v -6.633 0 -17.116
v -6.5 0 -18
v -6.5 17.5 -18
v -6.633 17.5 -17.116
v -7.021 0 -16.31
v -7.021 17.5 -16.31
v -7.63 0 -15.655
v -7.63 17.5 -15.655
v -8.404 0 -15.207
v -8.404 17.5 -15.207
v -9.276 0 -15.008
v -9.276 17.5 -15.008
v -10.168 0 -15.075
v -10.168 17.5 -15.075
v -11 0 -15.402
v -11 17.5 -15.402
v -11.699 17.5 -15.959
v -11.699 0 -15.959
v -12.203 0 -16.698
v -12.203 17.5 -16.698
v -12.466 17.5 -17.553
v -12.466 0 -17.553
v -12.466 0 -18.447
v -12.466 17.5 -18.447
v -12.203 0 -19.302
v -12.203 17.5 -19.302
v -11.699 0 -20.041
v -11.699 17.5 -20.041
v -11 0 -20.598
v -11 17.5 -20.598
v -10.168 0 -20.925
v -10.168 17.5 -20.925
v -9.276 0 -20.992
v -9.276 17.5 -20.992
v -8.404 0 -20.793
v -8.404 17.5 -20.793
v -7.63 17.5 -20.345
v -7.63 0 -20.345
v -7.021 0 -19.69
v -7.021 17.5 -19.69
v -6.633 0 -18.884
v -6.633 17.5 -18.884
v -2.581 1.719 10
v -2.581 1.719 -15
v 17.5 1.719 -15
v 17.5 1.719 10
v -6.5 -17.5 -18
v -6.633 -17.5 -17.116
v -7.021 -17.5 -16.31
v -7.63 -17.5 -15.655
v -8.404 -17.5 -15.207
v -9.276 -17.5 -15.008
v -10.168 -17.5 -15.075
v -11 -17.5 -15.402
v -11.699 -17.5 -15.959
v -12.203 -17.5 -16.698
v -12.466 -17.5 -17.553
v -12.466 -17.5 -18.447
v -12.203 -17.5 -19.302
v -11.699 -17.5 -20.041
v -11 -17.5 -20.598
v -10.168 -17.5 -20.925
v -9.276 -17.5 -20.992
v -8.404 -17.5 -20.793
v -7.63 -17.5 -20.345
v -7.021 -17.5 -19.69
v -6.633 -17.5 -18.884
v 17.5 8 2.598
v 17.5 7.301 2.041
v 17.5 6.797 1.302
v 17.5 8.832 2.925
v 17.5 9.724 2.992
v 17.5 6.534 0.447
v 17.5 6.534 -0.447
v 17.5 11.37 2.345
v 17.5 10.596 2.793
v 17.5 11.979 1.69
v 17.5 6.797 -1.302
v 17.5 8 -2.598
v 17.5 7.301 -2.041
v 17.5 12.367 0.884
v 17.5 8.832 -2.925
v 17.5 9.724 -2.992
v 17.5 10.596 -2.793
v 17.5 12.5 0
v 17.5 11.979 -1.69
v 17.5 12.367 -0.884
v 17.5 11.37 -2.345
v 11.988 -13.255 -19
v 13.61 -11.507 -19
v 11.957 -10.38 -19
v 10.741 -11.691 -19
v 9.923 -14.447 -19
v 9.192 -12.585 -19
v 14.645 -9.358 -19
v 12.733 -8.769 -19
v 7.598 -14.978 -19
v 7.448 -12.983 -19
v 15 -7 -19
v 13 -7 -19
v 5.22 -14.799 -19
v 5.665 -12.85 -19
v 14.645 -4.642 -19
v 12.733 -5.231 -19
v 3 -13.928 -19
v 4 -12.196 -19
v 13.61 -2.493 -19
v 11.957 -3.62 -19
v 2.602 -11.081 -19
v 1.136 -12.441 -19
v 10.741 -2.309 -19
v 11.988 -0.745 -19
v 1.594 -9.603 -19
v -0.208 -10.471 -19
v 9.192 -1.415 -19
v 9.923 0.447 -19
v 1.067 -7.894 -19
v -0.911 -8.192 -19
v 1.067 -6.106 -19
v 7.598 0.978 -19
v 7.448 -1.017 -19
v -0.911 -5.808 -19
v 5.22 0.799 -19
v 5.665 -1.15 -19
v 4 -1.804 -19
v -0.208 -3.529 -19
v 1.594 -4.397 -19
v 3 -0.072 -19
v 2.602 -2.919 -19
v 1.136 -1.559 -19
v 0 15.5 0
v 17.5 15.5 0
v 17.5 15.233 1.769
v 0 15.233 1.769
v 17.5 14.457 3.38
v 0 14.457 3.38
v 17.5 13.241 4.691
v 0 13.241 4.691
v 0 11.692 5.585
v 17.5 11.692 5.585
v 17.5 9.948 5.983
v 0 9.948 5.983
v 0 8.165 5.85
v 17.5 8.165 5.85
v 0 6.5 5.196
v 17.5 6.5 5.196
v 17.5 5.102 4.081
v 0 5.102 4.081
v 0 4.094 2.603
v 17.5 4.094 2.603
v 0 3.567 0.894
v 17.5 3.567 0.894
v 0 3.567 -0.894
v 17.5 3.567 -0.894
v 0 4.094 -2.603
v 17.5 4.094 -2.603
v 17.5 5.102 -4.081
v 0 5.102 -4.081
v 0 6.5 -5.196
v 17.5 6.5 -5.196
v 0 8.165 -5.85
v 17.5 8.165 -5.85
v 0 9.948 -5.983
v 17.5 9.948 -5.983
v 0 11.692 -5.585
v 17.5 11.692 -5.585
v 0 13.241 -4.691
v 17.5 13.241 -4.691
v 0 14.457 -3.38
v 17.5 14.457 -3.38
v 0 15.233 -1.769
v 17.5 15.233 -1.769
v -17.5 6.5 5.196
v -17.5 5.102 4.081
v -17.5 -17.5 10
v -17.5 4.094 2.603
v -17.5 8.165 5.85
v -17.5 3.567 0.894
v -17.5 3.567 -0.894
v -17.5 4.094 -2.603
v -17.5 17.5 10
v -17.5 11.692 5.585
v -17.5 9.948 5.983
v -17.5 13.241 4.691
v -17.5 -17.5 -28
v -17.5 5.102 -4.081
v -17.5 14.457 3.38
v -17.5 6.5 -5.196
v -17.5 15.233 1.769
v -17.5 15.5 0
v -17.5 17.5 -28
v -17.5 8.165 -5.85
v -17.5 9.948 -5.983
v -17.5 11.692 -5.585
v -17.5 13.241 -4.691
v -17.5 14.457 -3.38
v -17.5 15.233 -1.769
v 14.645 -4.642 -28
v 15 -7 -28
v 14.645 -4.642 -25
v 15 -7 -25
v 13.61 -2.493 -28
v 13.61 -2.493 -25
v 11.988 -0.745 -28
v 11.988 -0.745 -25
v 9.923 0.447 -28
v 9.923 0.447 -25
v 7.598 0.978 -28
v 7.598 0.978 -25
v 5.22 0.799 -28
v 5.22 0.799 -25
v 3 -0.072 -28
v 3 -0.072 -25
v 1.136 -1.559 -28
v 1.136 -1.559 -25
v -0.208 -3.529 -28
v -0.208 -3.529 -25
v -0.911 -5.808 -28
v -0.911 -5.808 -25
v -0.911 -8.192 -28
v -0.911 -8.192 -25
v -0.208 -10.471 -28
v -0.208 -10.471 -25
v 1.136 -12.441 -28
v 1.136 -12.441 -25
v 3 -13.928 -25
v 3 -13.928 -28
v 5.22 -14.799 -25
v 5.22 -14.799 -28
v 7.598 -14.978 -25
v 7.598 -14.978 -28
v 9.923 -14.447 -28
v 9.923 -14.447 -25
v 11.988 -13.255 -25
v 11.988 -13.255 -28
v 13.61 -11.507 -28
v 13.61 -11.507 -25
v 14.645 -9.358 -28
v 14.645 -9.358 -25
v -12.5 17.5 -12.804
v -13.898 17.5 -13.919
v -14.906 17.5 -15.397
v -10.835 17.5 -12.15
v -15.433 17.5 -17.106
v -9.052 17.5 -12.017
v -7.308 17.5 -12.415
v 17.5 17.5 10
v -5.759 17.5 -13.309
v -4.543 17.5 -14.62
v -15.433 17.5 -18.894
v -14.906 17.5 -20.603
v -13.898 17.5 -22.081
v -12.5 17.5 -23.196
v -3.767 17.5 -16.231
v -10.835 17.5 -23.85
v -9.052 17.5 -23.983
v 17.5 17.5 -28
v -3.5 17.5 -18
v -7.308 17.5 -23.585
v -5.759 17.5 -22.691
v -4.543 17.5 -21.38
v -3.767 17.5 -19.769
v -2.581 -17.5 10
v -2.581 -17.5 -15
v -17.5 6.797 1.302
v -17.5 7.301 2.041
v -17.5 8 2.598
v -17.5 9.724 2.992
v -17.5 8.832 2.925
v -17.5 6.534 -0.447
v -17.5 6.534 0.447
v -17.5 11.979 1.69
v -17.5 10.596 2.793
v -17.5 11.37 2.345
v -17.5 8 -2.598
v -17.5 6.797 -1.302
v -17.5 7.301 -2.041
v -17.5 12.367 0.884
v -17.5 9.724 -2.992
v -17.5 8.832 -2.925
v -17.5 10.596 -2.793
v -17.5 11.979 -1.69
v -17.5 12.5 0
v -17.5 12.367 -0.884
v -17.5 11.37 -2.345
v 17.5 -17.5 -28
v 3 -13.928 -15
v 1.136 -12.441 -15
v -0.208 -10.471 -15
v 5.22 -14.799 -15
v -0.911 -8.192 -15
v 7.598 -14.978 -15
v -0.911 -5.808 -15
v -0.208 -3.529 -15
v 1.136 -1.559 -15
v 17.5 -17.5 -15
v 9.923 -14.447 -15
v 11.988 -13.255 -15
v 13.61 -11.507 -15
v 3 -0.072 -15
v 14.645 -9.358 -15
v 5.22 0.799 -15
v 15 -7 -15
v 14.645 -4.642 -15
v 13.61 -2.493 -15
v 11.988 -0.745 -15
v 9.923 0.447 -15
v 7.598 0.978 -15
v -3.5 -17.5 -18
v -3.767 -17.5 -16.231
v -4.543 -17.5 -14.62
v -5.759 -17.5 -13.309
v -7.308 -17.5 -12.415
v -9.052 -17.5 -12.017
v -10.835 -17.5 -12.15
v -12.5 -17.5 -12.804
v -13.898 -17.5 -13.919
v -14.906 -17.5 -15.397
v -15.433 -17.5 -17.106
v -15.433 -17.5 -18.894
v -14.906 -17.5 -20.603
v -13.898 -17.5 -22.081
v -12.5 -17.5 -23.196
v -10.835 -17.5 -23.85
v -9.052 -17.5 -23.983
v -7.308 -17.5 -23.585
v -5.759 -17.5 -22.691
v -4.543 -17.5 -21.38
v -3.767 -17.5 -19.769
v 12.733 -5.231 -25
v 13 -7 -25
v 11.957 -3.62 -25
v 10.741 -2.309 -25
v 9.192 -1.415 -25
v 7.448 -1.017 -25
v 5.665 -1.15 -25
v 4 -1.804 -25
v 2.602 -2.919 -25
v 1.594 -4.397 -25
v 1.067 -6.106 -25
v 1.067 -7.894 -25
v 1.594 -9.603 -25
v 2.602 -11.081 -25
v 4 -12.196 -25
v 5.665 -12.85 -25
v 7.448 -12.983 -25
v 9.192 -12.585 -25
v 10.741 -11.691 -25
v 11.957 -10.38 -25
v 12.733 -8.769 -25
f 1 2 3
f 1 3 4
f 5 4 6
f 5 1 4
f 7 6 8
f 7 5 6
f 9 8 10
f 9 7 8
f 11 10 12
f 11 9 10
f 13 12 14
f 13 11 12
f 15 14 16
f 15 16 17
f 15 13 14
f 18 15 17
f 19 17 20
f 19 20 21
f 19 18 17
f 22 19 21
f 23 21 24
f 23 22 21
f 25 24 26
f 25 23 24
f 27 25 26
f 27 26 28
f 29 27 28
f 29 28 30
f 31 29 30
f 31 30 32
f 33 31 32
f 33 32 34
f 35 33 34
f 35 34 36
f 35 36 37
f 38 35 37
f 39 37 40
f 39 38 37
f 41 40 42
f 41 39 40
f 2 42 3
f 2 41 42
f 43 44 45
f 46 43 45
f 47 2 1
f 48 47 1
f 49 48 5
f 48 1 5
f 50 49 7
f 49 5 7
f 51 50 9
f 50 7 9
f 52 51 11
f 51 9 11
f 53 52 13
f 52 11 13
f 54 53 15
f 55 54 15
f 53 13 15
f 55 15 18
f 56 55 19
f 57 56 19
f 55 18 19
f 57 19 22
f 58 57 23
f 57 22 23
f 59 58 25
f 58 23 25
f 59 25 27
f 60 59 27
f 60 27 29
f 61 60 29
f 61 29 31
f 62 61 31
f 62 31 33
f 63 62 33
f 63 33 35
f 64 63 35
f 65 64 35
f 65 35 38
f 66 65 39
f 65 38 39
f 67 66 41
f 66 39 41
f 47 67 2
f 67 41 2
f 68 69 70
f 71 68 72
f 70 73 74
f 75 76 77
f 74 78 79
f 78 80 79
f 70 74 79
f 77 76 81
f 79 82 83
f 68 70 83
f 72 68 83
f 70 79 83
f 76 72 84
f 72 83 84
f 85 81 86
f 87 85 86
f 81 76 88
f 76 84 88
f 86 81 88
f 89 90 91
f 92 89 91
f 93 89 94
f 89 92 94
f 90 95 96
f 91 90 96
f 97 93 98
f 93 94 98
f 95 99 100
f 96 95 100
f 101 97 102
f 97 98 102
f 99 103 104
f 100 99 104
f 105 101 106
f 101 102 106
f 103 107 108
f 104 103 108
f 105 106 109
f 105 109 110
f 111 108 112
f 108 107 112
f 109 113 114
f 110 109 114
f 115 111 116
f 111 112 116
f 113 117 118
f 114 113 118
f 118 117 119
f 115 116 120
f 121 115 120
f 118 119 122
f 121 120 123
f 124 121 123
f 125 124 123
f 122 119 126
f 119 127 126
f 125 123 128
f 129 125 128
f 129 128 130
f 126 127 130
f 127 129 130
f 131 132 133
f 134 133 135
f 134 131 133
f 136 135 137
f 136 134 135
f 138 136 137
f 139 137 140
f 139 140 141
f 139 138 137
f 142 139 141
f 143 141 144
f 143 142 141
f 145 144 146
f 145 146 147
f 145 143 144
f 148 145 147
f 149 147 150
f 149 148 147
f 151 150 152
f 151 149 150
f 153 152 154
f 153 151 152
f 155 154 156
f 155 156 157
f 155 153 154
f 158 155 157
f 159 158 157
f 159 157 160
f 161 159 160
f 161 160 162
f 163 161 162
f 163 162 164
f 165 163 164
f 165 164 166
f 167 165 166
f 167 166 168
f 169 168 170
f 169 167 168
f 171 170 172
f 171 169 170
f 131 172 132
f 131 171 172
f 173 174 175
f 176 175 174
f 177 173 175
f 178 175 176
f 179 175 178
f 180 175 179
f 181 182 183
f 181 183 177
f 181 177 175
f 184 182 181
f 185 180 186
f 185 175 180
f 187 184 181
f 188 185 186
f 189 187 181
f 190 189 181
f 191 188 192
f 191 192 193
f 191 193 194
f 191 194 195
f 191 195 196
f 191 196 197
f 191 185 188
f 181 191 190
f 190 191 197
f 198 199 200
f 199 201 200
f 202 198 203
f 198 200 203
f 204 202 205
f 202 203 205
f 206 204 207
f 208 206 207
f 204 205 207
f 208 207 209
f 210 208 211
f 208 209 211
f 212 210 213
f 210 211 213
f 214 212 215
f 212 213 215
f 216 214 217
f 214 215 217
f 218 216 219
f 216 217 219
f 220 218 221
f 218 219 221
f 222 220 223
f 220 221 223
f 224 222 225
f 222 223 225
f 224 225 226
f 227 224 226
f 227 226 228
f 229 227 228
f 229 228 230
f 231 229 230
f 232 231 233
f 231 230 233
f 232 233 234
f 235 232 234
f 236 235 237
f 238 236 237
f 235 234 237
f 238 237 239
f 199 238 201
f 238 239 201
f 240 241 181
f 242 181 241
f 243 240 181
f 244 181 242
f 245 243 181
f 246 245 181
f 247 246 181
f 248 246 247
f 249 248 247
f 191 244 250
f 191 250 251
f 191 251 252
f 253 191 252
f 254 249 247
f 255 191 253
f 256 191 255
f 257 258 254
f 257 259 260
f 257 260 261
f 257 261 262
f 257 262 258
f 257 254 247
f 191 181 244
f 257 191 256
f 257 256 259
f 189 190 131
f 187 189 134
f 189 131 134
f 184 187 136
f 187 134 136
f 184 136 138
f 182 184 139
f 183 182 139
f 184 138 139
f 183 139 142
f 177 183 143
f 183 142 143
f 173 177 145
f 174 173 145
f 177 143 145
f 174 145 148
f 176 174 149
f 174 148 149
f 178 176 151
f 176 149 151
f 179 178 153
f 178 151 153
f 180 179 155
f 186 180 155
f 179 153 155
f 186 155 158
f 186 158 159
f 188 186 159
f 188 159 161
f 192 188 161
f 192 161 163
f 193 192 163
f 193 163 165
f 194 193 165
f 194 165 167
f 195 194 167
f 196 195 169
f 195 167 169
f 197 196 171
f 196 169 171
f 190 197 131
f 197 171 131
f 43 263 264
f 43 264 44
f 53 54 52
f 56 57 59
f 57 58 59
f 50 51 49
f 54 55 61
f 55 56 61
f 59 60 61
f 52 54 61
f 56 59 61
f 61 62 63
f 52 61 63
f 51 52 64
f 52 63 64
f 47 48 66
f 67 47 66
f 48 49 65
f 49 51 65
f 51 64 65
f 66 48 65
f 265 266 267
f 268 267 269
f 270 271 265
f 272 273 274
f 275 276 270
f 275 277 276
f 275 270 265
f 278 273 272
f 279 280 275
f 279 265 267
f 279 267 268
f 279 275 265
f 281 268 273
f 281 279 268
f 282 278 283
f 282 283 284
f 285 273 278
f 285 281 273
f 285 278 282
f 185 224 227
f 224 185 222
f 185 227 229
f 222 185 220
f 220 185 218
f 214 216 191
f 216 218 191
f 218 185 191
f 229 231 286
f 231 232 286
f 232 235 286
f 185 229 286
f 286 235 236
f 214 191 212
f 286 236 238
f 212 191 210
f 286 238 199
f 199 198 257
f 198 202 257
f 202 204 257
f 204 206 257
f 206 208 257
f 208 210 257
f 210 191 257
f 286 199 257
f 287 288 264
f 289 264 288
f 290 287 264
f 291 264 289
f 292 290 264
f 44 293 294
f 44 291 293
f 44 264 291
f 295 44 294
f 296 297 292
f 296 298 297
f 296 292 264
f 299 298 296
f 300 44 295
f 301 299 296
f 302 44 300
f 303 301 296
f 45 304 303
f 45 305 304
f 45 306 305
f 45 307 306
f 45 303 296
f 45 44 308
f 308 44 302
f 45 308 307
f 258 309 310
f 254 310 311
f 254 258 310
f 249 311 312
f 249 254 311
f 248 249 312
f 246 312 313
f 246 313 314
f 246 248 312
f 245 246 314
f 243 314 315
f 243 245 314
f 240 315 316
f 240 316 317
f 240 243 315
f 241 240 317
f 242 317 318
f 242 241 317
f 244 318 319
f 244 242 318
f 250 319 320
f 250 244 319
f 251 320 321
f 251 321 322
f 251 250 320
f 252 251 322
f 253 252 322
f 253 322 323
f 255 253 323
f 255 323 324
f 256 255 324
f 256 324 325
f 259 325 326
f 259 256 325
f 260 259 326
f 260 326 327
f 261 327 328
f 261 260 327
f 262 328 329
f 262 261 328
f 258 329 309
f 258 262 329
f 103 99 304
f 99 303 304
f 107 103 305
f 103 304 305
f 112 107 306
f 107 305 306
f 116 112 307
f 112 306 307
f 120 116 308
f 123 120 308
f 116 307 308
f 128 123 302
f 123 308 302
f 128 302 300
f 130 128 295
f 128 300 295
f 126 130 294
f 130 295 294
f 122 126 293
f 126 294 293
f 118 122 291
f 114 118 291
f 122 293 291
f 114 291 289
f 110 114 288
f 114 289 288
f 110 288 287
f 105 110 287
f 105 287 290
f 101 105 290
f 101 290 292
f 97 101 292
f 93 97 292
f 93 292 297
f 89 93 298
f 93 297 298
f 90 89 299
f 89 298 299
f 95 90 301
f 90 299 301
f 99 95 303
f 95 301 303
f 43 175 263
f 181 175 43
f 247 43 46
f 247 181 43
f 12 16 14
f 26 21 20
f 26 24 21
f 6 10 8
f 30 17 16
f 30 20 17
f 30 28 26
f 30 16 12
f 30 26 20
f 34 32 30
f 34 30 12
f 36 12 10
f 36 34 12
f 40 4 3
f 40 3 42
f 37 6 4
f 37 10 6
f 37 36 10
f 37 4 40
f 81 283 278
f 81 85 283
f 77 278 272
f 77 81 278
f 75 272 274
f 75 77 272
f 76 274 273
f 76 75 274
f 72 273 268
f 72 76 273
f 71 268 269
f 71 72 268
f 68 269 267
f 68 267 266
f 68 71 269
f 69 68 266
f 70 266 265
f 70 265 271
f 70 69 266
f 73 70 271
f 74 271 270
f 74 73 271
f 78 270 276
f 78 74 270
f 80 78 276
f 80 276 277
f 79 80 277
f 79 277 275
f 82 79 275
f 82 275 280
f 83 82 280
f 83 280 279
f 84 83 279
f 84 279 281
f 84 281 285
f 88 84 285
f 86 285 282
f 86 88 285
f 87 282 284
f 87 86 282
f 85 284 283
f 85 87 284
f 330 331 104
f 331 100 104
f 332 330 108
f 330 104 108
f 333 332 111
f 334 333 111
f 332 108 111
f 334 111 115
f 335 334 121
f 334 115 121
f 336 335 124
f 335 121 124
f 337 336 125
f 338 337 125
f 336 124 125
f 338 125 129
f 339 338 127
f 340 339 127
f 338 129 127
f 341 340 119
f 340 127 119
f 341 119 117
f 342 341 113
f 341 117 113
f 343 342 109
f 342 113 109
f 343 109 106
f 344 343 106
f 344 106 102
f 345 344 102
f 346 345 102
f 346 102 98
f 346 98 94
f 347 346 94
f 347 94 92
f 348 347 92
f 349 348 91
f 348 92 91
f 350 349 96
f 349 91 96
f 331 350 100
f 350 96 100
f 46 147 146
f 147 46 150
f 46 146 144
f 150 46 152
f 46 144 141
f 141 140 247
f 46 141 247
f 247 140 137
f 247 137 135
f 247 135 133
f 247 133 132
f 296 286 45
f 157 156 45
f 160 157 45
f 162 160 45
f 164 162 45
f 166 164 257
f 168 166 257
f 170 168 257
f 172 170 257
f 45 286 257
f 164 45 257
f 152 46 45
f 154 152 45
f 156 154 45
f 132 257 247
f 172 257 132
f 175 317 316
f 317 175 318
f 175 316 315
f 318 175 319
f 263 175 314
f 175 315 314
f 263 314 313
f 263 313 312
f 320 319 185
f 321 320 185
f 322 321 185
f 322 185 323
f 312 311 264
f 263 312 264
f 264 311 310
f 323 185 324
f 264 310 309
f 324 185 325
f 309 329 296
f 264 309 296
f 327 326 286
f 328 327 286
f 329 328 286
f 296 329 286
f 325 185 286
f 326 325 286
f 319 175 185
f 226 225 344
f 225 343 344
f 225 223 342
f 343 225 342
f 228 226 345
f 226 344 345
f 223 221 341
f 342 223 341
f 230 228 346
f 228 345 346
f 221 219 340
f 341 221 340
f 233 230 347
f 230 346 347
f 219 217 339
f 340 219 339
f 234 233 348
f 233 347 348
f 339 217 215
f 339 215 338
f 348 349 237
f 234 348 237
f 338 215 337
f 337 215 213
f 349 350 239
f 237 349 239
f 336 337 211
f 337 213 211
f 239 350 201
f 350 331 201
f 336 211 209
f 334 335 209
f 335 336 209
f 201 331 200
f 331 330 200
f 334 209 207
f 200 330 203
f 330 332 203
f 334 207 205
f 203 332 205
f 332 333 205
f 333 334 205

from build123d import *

# Parameters (mm, degrees)
F0_R          = 6
F0_R_2        = 3
F1_DEPTH      = 17.5
F1_DEPTH_BACK = 17.5
F2_R          = 6
F2_R_2        = 3
F3_DEPTH      = 17.5
F3_DEPTH_BACK = 17.5
F5_W          = 35
F5_H          = 35
F9_DEPTH      = 38
F11_W         = 20.0814460665
F11_H         = 19.2192889936
F12_DEPTH     = 25


with BuildPart() as f1:
    # F0 (on Right) → F1 (new body, two sides)
    with BuildSketch(Plane.YZ) as f1_sk:
        with Locations((9.5, 0)):
            Circle(F0_R)
        with Locations((9.5, 0)):
            Circle(F0_R_2, mode=Mode.SUBTRACT)
    extrude(amount=-F1_DEPTH)
    extrude(f1_sk.sketch, amount=F1_DEPTH_BACK)


with BuildPart() as f3:
    # F2 (on Front) → F3 (new body, two sides)
    with BuildSketch(Plane.XZ) as f3_sk:
        with Locations((-9.5, -18)):
            Circle(F2_R)
        with Locations((-9.5, -18)):
            Circle(F2_R_2, mode=Mode.SUBTRACT)
    extrude(amount=-F3_DEPTH)
    extrude(f3_sk.sketch, amount=F3_DEPTH_BACK)


with BuildPart() as f8:
    # F7 (on plane+point) → F8 (revolve)
    with BuildSketch(Plane.XZ.offset(7)):
        Polygon((7, -15), (7, -28), (13, -28), (15, -28), (15, -25), (13, -25), (13, -19), (15, -19), (15, -15), align=None)
    revolve(axis=Axis((7, -7, -17.05239507), (0, 0, 1)))


with BuildPart() as f9:
    # F5 (on offset) → F9 (new body)
    with BuildSketch(Plane.XY.offset(-28)):
        Rectangle(F5_W, F5_H)
    extrude(amount=F9_DEPTH)

    # F10: cut F8
    add(f8.part, mode=Mode.SUBTRACT)

    # F11 (on face) → F12 (cut)
    with BuildSketch(Plane.XY.offset(10)):
        with Locations((7.4592769668, -7.8903555032)):
            Rectangle(F11_W, F11_H)
    extrude(amount=-F12_DEPTH, mode=Mode.SUBTRACT)

    # F13: cut F3, F1
    add(f3.part, mode=Mode.SUBTRACT)
    add(f1.part, mode=Mode.SUBTRACT)


solid = f9.part
